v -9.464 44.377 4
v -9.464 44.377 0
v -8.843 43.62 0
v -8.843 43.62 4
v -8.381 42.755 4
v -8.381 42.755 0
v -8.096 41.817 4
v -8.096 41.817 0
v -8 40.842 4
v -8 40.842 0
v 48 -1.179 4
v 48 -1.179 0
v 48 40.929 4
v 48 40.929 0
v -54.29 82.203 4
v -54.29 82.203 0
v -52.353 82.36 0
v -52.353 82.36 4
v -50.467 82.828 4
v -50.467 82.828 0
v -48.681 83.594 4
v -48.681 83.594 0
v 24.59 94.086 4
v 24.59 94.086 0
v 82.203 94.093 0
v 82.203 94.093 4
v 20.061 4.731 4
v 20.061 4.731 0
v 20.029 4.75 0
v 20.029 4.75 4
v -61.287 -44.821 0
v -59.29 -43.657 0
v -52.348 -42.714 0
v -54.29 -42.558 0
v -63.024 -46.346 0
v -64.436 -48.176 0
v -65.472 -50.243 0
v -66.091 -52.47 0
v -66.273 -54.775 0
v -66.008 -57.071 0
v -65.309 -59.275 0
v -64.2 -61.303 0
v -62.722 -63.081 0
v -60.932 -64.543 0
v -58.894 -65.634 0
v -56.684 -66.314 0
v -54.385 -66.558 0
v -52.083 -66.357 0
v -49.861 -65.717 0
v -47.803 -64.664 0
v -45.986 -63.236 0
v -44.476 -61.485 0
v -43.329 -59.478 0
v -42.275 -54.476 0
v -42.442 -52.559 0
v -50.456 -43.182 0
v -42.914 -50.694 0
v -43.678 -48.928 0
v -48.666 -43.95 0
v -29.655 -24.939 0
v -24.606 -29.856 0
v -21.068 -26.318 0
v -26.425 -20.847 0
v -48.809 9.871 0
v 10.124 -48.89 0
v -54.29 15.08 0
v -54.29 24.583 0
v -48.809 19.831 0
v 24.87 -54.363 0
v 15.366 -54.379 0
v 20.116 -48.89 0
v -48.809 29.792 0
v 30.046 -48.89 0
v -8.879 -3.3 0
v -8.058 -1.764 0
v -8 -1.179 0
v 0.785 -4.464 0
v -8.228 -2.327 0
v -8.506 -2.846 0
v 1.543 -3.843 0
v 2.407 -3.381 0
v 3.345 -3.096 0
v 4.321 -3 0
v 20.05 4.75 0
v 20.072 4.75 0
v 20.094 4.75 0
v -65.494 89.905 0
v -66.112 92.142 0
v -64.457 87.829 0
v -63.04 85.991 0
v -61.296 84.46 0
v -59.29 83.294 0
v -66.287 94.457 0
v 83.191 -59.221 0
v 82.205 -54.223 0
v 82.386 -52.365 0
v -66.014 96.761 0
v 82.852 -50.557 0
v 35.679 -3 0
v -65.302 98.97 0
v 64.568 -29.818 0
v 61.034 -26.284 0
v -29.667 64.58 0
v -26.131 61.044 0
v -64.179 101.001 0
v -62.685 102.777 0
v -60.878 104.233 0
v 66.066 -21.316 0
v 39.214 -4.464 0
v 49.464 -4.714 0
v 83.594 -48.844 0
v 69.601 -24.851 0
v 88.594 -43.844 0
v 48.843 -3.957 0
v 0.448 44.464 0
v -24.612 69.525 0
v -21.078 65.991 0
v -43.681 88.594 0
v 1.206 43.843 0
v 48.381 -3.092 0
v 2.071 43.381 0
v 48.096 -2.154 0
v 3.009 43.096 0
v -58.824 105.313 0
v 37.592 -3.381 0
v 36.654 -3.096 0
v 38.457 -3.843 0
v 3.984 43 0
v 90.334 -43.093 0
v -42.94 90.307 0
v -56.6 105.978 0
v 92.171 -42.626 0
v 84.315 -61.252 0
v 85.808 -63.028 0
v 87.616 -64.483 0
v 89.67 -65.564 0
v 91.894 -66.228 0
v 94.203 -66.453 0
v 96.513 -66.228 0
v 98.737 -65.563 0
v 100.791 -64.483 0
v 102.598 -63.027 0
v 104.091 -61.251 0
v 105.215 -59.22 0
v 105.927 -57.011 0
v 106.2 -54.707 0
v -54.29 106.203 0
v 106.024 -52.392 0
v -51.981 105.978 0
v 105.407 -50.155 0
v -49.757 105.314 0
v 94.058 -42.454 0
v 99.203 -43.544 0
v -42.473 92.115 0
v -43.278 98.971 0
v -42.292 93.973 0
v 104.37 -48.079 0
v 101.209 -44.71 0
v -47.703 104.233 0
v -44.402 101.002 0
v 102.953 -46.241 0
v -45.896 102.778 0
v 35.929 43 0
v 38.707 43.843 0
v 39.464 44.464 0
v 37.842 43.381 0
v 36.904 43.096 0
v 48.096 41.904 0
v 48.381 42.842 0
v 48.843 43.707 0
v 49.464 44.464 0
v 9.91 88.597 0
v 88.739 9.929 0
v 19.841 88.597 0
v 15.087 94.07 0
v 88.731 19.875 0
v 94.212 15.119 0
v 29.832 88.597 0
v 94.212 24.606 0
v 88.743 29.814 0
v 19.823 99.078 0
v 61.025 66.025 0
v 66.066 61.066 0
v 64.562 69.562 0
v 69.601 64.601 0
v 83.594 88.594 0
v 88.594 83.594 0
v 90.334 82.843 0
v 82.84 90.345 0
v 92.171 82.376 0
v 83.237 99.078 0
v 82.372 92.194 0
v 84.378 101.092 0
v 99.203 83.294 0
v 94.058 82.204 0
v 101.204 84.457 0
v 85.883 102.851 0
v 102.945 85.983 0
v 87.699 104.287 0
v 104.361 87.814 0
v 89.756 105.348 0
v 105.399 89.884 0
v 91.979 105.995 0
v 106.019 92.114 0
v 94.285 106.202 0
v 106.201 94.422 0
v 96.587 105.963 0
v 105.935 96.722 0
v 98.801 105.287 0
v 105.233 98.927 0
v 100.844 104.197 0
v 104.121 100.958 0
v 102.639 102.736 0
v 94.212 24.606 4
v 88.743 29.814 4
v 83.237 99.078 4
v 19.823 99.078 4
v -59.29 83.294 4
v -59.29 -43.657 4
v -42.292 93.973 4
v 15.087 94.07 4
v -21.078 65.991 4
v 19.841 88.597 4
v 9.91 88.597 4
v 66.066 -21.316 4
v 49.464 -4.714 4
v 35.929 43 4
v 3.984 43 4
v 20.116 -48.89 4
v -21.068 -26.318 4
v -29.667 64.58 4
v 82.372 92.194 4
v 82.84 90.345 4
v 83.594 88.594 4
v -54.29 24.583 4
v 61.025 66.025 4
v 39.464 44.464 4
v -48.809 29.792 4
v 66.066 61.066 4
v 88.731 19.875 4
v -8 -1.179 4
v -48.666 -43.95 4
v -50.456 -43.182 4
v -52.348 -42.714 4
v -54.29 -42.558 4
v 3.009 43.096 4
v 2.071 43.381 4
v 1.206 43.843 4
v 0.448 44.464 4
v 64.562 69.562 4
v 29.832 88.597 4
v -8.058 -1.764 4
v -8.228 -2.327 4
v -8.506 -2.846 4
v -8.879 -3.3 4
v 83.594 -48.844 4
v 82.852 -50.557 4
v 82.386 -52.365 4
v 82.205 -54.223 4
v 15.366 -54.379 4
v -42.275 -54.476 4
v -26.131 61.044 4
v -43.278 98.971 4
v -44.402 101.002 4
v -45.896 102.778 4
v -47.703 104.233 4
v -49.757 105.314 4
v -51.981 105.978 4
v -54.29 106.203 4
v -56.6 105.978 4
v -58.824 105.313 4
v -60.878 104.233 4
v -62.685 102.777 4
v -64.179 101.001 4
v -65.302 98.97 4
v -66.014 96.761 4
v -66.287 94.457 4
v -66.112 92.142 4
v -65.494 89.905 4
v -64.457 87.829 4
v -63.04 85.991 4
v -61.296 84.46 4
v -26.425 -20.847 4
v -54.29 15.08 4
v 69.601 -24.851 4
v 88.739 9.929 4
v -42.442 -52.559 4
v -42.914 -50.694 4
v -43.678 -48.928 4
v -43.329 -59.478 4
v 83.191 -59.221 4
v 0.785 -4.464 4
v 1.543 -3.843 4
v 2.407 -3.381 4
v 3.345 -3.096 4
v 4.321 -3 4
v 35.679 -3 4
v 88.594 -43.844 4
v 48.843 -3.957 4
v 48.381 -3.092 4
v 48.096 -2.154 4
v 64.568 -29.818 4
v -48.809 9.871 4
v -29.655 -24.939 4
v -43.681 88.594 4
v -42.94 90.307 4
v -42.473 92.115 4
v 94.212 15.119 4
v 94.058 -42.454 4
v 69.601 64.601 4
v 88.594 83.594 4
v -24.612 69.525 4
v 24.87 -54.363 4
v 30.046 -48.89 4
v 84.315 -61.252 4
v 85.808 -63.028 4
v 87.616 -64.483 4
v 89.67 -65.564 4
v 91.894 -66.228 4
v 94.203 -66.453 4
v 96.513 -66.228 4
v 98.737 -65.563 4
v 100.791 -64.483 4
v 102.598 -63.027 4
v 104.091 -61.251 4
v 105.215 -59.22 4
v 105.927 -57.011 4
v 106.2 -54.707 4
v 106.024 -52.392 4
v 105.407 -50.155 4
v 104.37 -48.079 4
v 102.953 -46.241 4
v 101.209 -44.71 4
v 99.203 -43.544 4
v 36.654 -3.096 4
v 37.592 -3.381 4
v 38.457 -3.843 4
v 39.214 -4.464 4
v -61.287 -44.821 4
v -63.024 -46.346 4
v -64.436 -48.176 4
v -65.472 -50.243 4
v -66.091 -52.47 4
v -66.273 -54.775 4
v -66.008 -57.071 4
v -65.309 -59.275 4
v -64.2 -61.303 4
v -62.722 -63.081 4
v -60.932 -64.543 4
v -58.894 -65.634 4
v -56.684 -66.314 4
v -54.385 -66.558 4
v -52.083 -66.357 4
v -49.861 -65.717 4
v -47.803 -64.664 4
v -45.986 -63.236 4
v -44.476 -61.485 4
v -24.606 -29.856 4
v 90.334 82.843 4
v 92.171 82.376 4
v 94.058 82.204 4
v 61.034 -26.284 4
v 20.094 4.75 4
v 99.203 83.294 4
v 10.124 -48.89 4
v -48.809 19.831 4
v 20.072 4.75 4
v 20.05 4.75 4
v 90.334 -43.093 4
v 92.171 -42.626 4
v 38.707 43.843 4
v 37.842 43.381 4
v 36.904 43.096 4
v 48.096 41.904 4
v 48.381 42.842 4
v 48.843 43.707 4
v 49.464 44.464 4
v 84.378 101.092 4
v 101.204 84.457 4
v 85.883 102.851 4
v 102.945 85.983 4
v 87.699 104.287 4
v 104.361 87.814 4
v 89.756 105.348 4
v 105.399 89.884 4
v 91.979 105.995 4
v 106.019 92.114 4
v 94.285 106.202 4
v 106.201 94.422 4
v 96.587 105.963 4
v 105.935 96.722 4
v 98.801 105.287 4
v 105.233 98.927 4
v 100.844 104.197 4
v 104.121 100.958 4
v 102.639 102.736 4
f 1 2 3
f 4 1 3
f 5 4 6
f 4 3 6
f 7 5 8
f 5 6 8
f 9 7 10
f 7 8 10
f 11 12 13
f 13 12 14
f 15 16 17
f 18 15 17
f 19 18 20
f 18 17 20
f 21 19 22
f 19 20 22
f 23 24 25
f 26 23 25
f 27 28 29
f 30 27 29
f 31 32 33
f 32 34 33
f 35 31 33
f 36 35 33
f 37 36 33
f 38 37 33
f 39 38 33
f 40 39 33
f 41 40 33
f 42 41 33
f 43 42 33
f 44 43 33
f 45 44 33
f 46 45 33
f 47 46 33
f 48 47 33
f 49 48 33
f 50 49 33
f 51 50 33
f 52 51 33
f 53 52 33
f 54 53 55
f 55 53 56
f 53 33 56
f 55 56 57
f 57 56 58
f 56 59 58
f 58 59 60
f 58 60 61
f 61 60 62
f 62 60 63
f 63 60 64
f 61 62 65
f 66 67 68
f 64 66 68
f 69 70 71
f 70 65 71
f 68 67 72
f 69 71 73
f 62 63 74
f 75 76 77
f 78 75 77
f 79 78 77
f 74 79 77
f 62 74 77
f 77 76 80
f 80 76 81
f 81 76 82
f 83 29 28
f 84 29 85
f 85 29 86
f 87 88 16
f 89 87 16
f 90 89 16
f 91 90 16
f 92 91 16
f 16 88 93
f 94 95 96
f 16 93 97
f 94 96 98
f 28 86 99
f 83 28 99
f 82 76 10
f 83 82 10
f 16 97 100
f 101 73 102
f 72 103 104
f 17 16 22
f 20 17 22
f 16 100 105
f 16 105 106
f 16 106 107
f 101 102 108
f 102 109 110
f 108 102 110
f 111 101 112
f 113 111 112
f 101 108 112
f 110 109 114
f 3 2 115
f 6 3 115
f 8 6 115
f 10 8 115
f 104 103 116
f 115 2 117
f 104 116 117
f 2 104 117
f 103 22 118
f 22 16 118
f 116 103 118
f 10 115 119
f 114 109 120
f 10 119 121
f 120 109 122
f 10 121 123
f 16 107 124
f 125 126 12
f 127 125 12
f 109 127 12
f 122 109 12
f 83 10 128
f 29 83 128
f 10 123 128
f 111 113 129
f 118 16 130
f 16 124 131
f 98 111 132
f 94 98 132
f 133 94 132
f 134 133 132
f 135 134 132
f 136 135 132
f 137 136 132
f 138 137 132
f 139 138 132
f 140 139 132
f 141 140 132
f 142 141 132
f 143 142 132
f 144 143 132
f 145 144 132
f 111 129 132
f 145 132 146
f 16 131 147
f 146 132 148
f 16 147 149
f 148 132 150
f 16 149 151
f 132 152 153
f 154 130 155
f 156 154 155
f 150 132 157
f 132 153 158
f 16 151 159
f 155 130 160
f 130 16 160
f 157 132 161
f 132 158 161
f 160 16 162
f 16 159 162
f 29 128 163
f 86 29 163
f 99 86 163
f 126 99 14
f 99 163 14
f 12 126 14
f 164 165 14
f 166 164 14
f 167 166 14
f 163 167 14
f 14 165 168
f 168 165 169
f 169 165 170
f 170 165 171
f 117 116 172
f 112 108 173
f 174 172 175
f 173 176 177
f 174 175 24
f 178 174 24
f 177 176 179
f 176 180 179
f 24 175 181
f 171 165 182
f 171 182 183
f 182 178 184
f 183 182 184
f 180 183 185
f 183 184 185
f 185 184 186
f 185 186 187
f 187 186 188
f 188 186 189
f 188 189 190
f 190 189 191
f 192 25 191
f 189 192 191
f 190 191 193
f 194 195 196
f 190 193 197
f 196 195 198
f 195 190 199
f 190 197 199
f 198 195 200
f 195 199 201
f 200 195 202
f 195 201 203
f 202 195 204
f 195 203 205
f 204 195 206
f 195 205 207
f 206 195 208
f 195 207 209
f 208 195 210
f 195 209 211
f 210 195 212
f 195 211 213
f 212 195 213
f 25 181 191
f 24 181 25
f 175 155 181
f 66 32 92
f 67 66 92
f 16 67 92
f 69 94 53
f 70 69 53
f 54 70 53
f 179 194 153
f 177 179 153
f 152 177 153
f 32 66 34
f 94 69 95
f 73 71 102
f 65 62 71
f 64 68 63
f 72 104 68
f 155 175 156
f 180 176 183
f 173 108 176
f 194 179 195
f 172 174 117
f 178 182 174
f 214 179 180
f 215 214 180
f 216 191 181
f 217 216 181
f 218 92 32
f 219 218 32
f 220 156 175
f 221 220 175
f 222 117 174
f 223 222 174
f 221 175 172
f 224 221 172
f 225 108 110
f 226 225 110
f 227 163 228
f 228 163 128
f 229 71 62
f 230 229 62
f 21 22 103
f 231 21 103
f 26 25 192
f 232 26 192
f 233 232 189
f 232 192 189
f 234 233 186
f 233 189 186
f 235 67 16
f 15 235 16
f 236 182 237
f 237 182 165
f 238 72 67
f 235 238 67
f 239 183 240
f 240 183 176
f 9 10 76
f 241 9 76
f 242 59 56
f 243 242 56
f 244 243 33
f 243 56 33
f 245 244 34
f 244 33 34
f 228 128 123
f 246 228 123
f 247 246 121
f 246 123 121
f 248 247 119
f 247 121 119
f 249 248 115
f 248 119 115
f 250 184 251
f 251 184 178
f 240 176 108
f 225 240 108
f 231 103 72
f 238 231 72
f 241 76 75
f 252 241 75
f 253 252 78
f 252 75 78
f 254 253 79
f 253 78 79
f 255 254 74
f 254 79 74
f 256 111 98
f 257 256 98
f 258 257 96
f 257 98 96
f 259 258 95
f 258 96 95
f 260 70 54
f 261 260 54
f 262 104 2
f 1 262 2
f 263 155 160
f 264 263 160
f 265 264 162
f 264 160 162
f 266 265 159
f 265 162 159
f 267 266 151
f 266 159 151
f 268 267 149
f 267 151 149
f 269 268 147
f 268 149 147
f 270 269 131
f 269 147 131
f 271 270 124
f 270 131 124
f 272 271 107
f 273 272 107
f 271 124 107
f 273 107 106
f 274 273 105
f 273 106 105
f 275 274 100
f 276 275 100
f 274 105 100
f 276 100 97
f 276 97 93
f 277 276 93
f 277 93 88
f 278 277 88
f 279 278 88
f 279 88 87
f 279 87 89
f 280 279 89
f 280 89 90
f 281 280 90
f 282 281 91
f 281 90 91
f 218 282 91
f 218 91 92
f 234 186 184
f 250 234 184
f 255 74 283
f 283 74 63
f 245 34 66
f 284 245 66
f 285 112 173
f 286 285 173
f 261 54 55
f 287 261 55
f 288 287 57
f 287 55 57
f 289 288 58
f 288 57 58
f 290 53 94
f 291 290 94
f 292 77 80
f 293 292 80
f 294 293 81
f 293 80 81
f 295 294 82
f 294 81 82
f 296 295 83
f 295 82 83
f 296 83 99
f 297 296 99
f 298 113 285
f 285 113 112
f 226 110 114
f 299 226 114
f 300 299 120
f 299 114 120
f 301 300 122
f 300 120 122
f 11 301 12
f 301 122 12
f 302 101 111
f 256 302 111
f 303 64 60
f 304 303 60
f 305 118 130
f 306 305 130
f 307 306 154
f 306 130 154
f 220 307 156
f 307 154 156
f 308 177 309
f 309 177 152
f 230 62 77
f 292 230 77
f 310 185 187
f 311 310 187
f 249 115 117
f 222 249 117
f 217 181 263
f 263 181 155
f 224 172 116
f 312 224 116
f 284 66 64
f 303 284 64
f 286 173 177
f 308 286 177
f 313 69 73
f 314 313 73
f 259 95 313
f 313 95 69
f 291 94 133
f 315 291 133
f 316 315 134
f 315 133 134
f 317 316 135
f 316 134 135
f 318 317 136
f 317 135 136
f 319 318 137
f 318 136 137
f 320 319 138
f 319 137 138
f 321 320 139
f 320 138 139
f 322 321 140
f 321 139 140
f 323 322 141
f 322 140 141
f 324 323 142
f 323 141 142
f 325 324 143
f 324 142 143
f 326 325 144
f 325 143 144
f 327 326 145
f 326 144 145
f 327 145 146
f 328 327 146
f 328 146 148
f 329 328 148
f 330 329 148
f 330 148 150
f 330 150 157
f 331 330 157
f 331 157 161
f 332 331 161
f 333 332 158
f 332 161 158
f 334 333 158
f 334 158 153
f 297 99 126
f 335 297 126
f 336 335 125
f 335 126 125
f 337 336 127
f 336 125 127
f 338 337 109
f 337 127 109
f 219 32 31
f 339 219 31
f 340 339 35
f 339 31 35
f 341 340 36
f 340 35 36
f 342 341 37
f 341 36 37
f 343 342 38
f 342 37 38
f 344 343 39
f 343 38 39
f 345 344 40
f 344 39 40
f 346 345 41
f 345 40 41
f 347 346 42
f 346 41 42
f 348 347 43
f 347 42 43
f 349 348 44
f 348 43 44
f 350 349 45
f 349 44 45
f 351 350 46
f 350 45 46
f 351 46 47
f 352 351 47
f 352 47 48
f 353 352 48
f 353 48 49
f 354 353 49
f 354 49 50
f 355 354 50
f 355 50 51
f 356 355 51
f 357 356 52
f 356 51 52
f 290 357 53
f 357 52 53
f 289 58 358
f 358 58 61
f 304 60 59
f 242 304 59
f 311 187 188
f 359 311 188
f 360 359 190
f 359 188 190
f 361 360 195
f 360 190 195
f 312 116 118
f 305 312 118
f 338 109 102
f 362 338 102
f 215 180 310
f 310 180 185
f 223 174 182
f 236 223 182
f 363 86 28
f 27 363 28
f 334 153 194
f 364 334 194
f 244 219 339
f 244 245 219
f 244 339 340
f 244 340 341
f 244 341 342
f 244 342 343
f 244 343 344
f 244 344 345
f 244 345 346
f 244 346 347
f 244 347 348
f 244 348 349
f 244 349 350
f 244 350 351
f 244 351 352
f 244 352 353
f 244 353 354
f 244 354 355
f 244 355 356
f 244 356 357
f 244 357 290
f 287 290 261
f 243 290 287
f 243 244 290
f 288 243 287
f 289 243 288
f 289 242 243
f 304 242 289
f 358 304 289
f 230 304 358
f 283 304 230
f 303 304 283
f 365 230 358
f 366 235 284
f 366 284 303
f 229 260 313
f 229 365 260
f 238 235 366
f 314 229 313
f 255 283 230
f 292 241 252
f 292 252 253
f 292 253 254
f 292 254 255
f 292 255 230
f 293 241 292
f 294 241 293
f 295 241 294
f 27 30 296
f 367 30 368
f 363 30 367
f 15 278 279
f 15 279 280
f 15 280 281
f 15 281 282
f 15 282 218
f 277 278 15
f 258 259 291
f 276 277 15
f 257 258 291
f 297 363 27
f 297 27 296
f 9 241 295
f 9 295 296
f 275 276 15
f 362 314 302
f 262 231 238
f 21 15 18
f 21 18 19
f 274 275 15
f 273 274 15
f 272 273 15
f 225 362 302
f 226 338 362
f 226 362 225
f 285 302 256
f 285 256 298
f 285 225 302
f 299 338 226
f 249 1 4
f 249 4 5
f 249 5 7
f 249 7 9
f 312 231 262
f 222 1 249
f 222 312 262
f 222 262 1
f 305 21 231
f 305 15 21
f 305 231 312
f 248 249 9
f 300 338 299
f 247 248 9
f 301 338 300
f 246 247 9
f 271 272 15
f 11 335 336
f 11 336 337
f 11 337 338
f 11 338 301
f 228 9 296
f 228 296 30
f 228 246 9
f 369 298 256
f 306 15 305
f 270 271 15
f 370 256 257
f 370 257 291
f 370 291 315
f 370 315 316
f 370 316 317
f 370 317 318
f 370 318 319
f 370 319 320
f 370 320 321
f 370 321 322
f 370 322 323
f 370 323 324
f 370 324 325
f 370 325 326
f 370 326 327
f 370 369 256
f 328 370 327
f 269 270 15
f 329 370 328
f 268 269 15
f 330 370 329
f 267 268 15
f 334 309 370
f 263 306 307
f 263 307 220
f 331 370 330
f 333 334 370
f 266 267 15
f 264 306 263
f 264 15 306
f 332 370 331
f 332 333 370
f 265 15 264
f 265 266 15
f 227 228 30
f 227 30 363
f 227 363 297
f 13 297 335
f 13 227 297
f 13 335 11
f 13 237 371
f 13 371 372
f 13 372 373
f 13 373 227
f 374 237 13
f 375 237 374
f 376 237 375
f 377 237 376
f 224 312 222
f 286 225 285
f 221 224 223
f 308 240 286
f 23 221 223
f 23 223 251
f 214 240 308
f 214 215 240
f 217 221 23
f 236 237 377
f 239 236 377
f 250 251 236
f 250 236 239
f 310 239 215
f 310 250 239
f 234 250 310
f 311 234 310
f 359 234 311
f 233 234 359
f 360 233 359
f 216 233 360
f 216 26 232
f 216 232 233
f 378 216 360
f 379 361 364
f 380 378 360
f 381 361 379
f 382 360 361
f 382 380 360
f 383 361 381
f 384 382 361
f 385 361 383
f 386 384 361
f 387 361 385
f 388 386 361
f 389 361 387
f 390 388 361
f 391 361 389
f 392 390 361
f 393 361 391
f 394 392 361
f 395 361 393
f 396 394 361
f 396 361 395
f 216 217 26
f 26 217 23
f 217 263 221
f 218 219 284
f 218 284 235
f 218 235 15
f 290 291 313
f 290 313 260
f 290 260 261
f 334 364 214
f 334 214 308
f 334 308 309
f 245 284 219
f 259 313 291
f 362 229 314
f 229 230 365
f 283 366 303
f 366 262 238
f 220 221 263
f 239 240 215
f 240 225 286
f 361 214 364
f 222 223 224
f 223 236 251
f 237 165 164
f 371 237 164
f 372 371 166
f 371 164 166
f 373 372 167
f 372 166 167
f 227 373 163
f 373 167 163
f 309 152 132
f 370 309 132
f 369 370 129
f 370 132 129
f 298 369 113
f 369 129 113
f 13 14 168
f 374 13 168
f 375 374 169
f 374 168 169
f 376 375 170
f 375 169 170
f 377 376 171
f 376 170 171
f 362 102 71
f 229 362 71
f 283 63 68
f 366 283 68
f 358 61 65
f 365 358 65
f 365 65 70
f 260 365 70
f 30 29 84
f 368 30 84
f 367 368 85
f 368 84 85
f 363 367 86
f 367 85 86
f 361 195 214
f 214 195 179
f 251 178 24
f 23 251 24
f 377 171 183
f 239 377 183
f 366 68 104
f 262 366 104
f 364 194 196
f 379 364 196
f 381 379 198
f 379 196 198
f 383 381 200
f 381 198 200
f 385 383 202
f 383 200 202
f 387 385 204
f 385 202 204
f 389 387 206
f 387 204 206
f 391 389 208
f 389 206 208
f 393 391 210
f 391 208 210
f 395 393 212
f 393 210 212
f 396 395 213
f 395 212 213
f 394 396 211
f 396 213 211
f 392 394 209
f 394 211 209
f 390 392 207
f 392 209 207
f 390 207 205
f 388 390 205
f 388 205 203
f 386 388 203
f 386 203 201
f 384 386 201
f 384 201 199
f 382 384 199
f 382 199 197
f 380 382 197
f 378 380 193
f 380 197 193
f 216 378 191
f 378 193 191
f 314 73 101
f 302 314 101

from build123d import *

# Parameters (mm, degrees)
F1_DEPTH = 4


with BuildPart() as f1:
    # F0 (on Top) → F1 (new body)
    with BuildSketch(Plane.XY):
        with BuildLine():
            Line((99.202662, 19.896773), (99.202662, 83.293949))
            ThreePointArc((99.202662, 83.293949), (102.639271, 102.736338), (83.237467, 99.077547))
            Line((83.237467, 99.077547), (19.823141, 99.077547))
            Line((19.823141, 99.077547), (-43.277989, 98.971398))
            ThreePointArc((-43.277989, 98.971398), (-62.685056, 102.776986), (-59.289763, 83.293949))
            Line((-59.289763, 83.293949), (-59.289763, 19.831447))
            Line((-59.289763, 19.831447), (-59.289763, -43.656712))
            ThreePointArc((-59.289763, -43.656712), (-62.72245, -63.080861), (-43.329186, -59.477778))
            Line((-43.329186, -59.477778), (83.190888, -59.221403))
            ThreePointArc((83.190888, -59.221403), (102.597955, -63.026992), (99.202662, -43.543955))
            Line((99.202662, -43.543955), (99.202662, 19.853222))
            Line((99.202662, 19.853222), (99.202662, 19.896773))
        make_face()
        with BuildLine():
            ThreePointArc((-42.274781, -54.475997), (-42.640605, -51.616895), (-43.677664, -48.927507))
            Line((-43.677664, -48.927507), (-24.605699, -29.855542))
            Line((-24.605699, -29.855542), (10.1243, -48.890038))
            Line((10.1243, -48.890038), (15.366075, -54.379034))
            Line((15.366075, -54.379034), (-42.274781, -54.475997))
        make_face(mode=Mode.SUBTRACT)
        with BuildLine():
            Line((-29.65462, -24.938536), (-48.66586, -43.949777))
            ThreePointArc((-48.66586, -43.949777), (-51.392585, -42.909613), (-54.289763, -42.558424))
            Line((-54.289763, -42.558424), (-54.289763, -42.539768))
            Line((-54.289763, -42.539768), (-54.289763, 15.079639))
            Line((-54.289763, 15.079639), (-48.808765, 9.87071))
            Line((-48.808765, 9.87071), (-29.65462, -24.938536))
        make_face(mode=Mode.SUBTRACT)
        with BuildLine():
            Line((20.115596, -48.890038), (-21.068434, -26.318277))
            Line((-21.068434, -26.318277), (0.785377, -4.464466))
            ThreePointArc((0.785377, -4.464466), (2.407493, -3.380602), (4.320911, -3))
            Line((4.320911, -3), (35.678927, -3))
            ThreePointArc((35.678927, -3), (37.592344, -3.380602), (39.214461, -4.464466))
            Line((39.214461, -4.464466), (61.034324, -26.284329))
            Line((61.034324, -26.284329), (20.115596, -48.890038))
        make_face(mode=Mode.SUBTRACT)
        with BuildLine():
            Line((64.568139, -29.818144), (83.594024, -48.844029))
            ThreePointArc((83.594024, -48.844029), (82.583872, -51.452044), (82.204858, -54.223054))
            Line((82.204858, -54.223054), (24.869697, -54.363046))
            Line((24.869697, -54.363046), (30.045989, -48.890038))
            Line((30.045989, -48.890038), (64.568139, -29.818144))
        make_face(mode=Mode.SUBTRACT)
        with BuildLine():
            Line((20.061165, 4.731285), (20.02865, 4.750027))
            ThreePointArc((20.02865, 4.750027), (20.061339, 4.750123), (20.094027, 4.75029))
            Line((20.094027, 4.75029), (20.061165, 4.731285))
        make_face(mode=Mode.SUBTRACT)
        with BuildLine():
            ThreePointArc((94.058243, -42.453536), (91.243307, -42.823298), (88.594024, -43.844029))
            Line((88.594024, -43.844029), (69.601331, -24.851336))
            Line((69.601331, -24.851336), (88.739303, 9.928519))
            Line((88.739303, 9.928519), (94.211702, 15.119198))
            Line((94.211702, 15.119198), (94.058243, -42.453536))
        make_face(mode=Mode.SUBTRACT)
        with BuildLine():
            Line((-8.87868, -3.300258), (-26.42517, -20.846748))
            Line((-26.42517, -20.846748), (-48.808765, 19.831447))
            Line((-48.808765, 19.831447), (-26.131123, 61.044022))
            Line((-26.131123, 61.044022), (-9.464466, 44.377365))
            ThreePointArc((-9.464466, 44.377365), (-8.380602, 42.755248), (-8, 40.841831))
            Line((-8, 40.841831), (-8, -1.178937))
            ThreePointArc((-8, -1.178937), (-8.228361, -2.326988), (-8.87868, -3.300258))
        make_face(mode=Mode.SUBTRACT)
        with BuildLine():
            Line((-48.681125, 83.594024), (-29.666657, 64.579555))
            Line((-29.666657, 64.579555), (-48.808765, 29.792184))
            Line((-48.808765, 29.792184), (-54.289763, 24.583255))
            Line((-54.289763, 24.583255), (-54.289763, 82.202662))
            ThreePointArc((-54.289763, 82.202662), (-51.400442, 82.555695), (-48.681125, 83.594024))
        make_face(mode=Mode.SUBTRACT)
        with BuildLine():
            Line((9.91038, 88.596564), (-24.61177, 69.524669))
            Line((-24.61177, 69.524669), (-43.681125, 88.594024))
            ThreePointArc((-43.681125, 88.594024), (-42.670973, 91.202039), (-42.291959, 93.973049))
            Line((-42.291959, 93.973049), (15.086671, 94.069572))
            Line((15.086671, 94.069572), (9.91038, 88.596564))
        make_face(mode=Mode.SUBTRACT)
        with BuildLine():
            Line((49.464466, 44.464466), (66.065797, 61.065797))
            Line((66.065797, 61.065797), (88.731457, 19.874997))
            Line((88.731457, 19.874997), (66.065797, -21.315802))
            Line((66.065797, -21.315802), (49.464466, -4.714471))
            ThreePointArc((49.464466, -4.714471), (48.380602, -3.092354), (48, -1.178937))
            Line((48, -1.178937), (48, 40.928932))
            ThreePointArc((48, 40.928932), (48.380602, 42.842349), (49.464466, 44.464466))
        make_face(mode=Mode.SUBTRACT)
        with BuildLine():
            Line((69.601331, 64.601331), (88.594024, 83.594024))
            ThreePointArc((88.594024, 83.594024), (91.243307, 82.573293), (94.058243, 82.203531))
            Line((94.058243, 82.203531), (94.211768, 24.606251))
            Line((94.211768, 24.606251), (88.743439, 29.813959))
            Line((88.743439, 29.813959), (69.601331, 64.601331))
        make_face(mode=Mode.SUBTRACT)
        with BuildLine():
            Line((19.840772, 88.596564), (61.024802, 66.024802))
            Line((61.024802, 66.024802), (39.464466, 44.464466))
            ThreePointArc((39.464466, 44.464466), (37.842349, 43.380602), (35.928932, 43))
            Line((35.928932, 43), (3.983967, 43))
            ThreePointArc((3.983967, 43), (2.07055, 43.380602), (0.448433, 44.464466))
            Line((0.448433, 44.464466), (-21.077956, 65.990855))
            Line((-21.077956, 65.990855), (19.840772, 88.596564))
        make_face(mode=Mode.SUBTRACT)
        with BuildLine():
            ThreePointArc((82.203158, 94.093463), (82.568962, 91.260377), (83.594024, 88.594024))
            Line((83.594024, 88.594024), (64.562068, 69.562068))
            Line((64.562068, 69.562068), (29.832068, 88.596564))
            Line((29.832068, 88.596564), (24.590293, 94.085559))
            Line((24.590293, 94.085559), (82.203158, 94.093463))
        make_face(mode=Mode.SUBTRACT)
    extrude(amount=F1_DEPTH)


solid = f1.part
